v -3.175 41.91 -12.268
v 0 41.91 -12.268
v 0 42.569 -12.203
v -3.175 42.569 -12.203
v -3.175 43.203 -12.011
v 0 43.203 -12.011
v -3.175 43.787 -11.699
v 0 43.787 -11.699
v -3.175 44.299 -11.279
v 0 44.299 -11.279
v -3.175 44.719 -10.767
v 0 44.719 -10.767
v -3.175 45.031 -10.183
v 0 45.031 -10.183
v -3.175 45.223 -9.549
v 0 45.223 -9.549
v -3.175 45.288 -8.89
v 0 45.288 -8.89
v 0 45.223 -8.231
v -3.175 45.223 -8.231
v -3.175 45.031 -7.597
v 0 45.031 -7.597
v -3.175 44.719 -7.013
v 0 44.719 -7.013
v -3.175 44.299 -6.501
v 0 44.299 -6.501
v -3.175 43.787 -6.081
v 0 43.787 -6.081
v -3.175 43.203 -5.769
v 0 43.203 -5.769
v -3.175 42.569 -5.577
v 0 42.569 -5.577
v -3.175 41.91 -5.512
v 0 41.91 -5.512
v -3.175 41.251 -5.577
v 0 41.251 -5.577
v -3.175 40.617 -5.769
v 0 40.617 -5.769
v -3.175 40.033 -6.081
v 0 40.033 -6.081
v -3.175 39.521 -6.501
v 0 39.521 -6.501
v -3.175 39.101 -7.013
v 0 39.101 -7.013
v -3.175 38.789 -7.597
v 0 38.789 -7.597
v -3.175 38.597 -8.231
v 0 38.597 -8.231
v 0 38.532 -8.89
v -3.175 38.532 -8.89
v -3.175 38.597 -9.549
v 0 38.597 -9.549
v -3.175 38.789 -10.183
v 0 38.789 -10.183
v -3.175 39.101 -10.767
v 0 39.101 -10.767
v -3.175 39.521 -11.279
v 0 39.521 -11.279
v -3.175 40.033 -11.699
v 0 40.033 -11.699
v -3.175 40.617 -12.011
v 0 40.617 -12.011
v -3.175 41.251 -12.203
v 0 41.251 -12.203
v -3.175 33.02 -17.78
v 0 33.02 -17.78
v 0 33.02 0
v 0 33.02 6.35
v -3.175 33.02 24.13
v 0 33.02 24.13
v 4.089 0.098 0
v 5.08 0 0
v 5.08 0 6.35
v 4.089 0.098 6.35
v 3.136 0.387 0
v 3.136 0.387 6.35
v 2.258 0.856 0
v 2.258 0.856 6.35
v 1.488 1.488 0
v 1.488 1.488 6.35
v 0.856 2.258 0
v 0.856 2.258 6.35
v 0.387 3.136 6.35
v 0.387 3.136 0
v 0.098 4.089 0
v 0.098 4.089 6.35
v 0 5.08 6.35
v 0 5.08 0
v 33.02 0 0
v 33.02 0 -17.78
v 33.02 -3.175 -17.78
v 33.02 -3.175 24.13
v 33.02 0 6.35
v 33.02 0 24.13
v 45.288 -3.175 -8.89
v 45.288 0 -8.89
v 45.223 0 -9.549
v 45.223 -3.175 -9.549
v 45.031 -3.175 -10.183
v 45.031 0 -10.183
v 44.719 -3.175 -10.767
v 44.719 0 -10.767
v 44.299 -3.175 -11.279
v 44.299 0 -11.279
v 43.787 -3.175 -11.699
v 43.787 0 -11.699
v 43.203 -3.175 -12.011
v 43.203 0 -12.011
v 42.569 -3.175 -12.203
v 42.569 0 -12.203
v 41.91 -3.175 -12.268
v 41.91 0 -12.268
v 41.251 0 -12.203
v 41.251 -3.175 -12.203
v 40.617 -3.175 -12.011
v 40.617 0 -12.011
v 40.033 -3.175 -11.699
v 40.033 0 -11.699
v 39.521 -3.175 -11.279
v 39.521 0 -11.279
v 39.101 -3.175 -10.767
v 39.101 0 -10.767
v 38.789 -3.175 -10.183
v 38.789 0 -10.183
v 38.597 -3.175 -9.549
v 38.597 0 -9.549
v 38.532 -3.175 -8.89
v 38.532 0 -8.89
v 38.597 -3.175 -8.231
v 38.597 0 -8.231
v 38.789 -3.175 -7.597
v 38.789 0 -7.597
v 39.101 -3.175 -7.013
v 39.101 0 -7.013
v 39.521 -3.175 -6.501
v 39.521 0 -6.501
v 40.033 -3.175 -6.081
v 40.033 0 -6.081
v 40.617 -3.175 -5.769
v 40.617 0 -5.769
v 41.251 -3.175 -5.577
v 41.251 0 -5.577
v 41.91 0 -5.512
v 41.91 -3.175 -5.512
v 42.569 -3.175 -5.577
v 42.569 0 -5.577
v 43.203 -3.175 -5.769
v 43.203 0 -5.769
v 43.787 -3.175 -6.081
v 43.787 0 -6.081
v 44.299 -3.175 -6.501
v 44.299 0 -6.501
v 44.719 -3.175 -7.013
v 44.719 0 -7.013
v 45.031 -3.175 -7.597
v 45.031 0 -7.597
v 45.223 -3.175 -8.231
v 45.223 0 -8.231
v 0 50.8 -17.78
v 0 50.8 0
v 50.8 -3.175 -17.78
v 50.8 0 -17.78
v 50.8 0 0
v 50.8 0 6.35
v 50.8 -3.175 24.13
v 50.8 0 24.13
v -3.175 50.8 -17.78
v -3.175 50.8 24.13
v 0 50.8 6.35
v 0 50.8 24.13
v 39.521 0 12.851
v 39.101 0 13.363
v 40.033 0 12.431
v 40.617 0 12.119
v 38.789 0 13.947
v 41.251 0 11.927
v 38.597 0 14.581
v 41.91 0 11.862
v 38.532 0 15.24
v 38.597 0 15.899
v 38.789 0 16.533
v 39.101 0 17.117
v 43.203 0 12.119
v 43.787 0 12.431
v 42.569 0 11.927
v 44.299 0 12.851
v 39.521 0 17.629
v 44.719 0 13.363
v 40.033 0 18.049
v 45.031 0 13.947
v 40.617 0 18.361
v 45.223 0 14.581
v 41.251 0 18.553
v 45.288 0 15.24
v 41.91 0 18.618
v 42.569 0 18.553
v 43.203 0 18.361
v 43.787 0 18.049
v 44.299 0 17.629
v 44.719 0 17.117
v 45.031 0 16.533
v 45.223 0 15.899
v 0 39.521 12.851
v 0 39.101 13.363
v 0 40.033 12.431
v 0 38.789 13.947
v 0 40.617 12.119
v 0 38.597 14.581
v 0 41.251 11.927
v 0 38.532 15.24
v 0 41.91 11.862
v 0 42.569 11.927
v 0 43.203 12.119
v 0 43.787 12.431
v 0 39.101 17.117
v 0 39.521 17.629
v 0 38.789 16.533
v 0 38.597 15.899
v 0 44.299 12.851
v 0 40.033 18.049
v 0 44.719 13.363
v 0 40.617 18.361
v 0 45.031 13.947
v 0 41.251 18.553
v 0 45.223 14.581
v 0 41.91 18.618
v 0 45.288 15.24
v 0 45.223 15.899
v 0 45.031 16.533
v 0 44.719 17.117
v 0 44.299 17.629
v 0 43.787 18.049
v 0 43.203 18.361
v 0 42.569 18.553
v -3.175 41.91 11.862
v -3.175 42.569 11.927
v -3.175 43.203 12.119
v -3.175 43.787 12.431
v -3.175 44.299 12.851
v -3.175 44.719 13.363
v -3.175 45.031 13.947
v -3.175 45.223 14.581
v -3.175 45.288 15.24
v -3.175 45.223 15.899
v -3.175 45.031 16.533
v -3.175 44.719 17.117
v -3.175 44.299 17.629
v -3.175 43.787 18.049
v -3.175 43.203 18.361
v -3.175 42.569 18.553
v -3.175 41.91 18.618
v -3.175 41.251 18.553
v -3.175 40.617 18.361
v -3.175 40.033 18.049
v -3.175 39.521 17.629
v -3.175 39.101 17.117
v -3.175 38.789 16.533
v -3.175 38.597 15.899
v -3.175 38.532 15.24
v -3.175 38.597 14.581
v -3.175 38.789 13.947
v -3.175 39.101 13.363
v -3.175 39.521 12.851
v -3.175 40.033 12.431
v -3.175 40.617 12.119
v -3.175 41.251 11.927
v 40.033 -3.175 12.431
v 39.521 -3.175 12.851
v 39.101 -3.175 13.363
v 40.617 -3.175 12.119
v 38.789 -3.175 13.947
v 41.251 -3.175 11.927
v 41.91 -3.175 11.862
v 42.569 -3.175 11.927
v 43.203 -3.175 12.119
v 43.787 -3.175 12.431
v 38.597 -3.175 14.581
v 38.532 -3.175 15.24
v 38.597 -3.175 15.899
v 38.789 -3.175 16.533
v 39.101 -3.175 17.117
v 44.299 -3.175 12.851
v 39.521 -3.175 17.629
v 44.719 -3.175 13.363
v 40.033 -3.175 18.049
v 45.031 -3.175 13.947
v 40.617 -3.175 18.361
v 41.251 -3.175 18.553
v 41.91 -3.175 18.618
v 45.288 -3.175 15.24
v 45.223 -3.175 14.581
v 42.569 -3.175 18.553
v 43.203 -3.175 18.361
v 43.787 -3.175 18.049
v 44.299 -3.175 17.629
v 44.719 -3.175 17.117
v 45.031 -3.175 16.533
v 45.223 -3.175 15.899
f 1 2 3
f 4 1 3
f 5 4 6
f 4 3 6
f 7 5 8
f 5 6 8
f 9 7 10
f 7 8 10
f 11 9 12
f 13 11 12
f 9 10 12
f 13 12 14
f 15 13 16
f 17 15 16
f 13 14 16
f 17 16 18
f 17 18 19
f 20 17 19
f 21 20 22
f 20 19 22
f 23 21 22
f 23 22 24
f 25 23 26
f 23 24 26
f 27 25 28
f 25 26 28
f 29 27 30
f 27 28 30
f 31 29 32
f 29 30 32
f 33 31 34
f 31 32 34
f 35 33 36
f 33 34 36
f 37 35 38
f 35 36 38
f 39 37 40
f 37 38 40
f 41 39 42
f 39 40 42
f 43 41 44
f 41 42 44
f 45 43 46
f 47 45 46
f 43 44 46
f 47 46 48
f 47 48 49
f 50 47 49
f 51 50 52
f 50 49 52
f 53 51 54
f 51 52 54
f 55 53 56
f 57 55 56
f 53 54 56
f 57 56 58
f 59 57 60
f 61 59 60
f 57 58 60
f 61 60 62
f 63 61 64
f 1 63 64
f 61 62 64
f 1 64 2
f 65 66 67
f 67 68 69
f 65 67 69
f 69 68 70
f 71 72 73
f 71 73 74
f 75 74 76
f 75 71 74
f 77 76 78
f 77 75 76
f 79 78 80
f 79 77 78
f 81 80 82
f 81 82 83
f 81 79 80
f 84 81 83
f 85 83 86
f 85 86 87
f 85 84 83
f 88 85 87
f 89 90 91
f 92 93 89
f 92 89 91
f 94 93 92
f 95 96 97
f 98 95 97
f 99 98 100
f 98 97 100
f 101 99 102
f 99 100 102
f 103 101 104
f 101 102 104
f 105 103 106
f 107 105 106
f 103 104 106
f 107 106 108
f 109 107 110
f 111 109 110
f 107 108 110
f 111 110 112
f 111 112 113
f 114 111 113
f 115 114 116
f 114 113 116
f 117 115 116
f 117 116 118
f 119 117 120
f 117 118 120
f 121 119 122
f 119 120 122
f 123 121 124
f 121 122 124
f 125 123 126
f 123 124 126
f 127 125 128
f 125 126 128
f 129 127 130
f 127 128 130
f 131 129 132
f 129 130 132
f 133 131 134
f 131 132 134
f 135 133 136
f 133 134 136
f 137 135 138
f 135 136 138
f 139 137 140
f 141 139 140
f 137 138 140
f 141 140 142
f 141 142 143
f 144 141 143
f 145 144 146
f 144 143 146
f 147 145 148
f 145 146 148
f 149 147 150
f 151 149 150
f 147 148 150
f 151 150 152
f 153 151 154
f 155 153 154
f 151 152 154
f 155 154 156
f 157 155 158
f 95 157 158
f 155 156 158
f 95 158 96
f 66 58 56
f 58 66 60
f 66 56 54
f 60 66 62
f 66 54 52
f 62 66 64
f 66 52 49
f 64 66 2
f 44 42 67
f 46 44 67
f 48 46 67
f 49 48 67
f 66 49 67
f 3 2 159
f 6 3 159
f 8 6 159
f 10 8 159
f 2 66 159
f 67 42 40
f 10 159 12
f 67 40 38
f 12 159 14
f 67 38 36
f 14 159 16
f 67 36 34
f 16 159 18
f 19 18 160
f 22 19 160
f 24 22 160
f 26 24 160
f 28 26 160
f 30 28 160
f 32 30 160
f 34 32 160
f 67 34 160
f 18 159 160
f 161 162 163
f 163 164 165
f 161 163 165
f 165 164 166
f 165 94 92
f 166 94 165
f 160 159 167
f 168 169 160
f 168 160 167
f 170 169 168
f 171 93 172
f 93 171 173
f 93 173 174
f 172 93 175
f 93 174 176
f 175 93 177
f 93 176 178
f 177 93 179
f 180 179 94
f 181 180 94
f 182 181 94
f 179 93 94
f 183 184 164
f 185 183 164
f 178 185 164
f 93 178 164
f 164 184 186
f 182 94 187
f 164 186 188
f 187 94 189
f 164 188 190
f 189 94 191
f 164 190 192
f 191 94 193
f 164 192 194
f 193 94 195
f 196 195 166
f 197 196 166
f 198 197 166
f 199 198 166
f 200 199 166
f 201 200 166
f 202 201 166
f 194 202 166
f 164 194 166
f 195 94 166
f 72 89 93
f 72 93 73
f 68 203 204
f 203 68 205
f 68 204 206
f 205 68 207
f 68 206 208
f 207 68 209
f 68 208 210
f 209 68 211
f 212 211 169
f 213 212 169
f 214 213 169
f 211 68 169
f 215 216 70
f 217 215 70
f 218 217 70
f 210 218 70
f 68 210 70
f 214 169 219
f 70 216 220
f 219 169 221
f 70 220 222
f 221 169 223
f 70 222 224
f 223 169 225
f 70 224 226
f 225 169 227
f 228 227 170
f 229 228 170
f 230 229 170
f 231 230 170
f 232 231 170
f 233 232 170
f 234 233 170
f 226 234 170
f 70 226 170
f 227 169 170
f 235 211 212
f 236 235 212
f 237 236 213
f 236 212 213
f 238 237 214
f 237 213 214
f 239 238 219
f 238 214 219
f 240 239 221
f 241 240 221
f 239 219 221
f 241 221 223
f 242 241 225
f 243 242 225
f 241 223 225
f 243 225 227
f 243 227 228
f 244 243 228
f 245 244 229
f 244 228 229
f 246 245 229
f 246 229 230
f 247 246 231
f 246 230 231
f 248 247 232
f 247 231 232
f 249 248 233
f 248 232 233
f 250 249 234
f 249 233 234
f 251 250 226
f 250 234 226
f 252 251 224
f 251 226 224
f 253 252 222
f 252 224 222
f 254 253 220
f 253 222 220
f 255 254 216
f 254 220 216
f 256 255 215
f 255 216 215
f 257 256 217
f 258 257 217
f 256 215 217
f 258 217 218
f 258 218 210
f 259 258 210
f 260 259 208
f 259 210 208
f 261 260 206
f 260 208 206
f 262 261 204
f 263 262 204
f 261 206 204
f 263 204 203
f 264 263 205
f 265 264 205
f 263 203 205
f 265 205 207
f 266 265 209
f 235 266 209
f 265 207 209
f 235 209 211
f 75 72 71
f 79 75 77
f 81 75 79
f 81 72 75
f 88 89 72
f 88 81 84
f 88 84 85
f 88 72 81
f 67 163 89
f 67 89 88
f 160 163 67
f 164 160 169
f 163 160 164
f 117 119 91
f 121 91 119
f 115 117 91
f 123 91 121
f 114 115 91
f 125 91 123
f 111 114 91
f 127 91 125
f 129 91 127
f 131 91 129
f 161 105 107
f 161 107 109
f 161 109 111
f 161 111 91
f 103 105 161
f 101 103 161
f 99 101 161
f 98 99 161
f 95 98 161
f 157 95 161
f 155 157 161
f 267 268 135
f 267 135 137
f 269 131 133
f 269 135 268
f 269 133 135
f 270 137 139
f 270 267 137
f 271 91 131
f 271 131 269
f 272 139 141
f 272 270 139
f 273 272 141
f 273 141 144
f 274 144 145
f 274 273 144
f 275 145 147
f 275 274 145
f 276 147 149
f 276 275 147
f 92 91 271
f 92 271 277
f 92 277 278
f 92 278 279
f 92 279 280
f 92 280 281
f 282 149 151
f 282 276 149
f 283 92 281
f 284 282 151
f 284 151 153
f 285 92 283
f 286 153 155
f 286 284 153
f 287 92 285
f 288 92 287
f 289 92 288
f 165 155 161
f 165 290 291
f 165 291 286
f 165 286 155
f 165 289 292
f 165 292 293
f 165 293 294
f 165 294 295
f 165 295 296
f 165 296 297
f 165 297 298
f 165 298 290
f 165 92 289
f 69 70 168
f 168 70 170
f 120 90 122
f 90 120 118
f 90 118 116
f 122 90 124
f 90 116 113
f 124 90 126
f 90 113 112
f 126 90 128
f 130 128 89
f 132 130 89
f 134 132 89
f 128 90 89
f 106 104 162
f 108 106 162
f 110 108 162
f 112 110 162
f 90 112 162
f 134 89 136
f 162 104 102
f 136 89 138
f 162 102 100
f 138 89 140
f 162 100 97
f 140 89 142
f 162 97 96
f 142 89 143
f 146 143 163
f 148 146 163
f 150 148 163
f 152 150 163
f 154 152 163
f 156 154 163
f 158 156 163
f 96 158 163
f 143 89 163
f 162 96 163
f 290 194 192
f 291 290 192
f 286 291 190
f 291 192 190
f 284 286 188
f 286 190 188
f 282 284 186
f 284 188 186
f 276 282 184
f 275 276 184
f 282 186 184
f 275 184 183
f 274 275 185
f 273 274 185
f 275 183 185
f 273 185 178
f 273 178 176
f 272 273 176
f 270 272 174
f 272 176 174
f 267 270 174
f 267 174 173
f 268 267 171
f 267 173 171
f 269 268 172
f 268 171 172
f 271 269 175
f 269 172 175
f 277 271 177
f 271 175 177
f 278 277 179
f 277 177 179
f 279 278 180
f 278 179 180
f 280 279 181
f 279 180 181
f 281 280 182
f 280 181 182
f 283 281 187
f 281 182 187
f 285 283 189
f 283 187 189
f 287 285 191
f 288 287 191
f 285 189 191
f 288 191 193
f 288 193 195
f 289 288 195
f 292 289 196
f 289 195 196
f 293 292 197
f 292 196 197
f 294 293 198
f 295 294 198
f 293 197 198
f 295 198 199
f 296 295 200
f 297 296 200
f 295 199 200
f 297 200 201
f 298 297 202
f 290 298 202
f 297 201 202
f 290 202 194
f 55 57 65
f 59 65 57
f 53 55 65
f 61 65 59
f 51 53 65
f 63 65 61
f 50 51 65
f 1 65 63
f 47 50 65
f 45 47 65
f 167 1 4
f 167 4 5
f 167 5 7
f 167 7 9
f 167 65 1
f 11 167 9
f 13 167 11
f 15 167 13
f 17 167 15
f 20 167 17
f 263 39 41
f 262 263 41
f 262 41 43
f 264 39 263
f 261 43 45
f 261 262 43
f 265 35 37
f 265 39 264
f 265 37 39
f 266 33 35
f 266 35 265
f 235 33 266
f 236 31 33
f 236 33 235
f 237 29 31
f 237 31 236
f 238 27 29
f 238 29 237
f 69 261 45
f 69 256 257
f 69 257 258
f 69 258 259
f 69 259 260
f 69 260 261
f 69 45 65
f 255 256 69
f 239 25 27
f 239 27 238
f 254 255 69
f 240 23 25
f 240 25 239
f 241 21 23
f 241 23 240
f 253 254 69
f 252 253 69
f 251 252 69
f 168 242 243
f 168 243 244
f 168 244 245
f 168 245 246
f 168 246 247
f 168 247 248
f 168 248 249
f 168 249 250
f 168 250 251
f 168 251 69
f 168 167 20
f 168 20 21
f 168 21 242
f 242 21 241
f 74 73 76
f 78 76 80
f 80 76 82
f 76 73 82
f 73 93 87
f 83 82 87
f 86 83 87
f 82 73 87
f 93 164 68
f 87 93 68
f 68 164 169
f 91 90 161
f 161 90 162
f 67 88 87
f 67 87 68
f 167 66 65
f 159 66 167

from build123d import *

# Parameters (mm, degrees)
BOSS_EXTRUDE1_DEPTH = 6.35
SKETCH2_W           = 41.91
SKETCH2_H           = 17.78
BOSS_EXTRUDE2_DEPTH = 3.175
SKETCH3_W           = 17.78
SKETCH3_H           = 41.91
BOSS_EXTRUDE3_DEPTH = 3.175
SKETCH4_R           = 3.3782
CUT_EXTRUDE1_DEPTH  = 3.175
SKETCH5_R           = 3.3782
CUT_EXTRUDE2_DEPTH  = 3.175


with BuildPart() as part:
    # Sketch1 → Boss-Extrude1 (new body)
    with BuildSketch(Plane.XY):
        with BuildLine():
            Line((0, 5.08), (0, 50.8))
            Line((0, 50.8), (50.8, 0))
            Line((50.8, 0), (5.08, 0))
            ThreePointArc((5.08, 0), (1.487897552, 1.487897552), (0, 5.08))
        make_face()
    extrude(amount=BOSS_EXTRUDE1_DEPTH)

    # Sketch2 → Boss-Extrude2 (add)
    with BuildSketch(Plane.ZY):
        with Locations((3.175, 41.91)):
            Rectangle(SKETCH2_W, SKETCH2_H)
    extrude(amount=BOSS_EXTRUDE2_DEPTH)

    # Sketch3 → Boss-Extrude3 (add)
    with BuildSketch(Plane.XZ):
        with Locations((41.91, 3.175)):
            Rectangle(SKETCH3_W, SKETCH3_H)
    extrude(amount=BOSS_EXTRUDE3_DEPTH)

    # Sketch4 → Cut-Extrude1 (cut)
    with BuildSketch(Plane(origin=(0, 0, 0), x_dir=(1, 0, 0), z_dir=(0, 1, 0))):
        with Locations((41.91, 8.89)):
            Circle(SKETCH4_R)
        with Locations((41.91, -15.24)):
            Circle(SKETCH4_R)
    extrude(amount=-CUT_EXTRUDE1_DEPTH, mode=Mode.SUBTRACT)

    # Sketch5 → Cut-Extrude2 (cut)
    with BuildSketch(Plane(origin=(0, 0, 0), x_dir=(0, 0, -1), z_dir=(1, 0, 0))):
        with Locations((-15.24, 41.91)):
            Circle(SKETCH5_R)
        with Locations((8.89, 41.91)):
            Circle(SKETCH5_R)
    extrude(amount=-CUT_EXTRUDE2_DEPTH, mode=Mode.SUBTRACT)


solid = part.part
